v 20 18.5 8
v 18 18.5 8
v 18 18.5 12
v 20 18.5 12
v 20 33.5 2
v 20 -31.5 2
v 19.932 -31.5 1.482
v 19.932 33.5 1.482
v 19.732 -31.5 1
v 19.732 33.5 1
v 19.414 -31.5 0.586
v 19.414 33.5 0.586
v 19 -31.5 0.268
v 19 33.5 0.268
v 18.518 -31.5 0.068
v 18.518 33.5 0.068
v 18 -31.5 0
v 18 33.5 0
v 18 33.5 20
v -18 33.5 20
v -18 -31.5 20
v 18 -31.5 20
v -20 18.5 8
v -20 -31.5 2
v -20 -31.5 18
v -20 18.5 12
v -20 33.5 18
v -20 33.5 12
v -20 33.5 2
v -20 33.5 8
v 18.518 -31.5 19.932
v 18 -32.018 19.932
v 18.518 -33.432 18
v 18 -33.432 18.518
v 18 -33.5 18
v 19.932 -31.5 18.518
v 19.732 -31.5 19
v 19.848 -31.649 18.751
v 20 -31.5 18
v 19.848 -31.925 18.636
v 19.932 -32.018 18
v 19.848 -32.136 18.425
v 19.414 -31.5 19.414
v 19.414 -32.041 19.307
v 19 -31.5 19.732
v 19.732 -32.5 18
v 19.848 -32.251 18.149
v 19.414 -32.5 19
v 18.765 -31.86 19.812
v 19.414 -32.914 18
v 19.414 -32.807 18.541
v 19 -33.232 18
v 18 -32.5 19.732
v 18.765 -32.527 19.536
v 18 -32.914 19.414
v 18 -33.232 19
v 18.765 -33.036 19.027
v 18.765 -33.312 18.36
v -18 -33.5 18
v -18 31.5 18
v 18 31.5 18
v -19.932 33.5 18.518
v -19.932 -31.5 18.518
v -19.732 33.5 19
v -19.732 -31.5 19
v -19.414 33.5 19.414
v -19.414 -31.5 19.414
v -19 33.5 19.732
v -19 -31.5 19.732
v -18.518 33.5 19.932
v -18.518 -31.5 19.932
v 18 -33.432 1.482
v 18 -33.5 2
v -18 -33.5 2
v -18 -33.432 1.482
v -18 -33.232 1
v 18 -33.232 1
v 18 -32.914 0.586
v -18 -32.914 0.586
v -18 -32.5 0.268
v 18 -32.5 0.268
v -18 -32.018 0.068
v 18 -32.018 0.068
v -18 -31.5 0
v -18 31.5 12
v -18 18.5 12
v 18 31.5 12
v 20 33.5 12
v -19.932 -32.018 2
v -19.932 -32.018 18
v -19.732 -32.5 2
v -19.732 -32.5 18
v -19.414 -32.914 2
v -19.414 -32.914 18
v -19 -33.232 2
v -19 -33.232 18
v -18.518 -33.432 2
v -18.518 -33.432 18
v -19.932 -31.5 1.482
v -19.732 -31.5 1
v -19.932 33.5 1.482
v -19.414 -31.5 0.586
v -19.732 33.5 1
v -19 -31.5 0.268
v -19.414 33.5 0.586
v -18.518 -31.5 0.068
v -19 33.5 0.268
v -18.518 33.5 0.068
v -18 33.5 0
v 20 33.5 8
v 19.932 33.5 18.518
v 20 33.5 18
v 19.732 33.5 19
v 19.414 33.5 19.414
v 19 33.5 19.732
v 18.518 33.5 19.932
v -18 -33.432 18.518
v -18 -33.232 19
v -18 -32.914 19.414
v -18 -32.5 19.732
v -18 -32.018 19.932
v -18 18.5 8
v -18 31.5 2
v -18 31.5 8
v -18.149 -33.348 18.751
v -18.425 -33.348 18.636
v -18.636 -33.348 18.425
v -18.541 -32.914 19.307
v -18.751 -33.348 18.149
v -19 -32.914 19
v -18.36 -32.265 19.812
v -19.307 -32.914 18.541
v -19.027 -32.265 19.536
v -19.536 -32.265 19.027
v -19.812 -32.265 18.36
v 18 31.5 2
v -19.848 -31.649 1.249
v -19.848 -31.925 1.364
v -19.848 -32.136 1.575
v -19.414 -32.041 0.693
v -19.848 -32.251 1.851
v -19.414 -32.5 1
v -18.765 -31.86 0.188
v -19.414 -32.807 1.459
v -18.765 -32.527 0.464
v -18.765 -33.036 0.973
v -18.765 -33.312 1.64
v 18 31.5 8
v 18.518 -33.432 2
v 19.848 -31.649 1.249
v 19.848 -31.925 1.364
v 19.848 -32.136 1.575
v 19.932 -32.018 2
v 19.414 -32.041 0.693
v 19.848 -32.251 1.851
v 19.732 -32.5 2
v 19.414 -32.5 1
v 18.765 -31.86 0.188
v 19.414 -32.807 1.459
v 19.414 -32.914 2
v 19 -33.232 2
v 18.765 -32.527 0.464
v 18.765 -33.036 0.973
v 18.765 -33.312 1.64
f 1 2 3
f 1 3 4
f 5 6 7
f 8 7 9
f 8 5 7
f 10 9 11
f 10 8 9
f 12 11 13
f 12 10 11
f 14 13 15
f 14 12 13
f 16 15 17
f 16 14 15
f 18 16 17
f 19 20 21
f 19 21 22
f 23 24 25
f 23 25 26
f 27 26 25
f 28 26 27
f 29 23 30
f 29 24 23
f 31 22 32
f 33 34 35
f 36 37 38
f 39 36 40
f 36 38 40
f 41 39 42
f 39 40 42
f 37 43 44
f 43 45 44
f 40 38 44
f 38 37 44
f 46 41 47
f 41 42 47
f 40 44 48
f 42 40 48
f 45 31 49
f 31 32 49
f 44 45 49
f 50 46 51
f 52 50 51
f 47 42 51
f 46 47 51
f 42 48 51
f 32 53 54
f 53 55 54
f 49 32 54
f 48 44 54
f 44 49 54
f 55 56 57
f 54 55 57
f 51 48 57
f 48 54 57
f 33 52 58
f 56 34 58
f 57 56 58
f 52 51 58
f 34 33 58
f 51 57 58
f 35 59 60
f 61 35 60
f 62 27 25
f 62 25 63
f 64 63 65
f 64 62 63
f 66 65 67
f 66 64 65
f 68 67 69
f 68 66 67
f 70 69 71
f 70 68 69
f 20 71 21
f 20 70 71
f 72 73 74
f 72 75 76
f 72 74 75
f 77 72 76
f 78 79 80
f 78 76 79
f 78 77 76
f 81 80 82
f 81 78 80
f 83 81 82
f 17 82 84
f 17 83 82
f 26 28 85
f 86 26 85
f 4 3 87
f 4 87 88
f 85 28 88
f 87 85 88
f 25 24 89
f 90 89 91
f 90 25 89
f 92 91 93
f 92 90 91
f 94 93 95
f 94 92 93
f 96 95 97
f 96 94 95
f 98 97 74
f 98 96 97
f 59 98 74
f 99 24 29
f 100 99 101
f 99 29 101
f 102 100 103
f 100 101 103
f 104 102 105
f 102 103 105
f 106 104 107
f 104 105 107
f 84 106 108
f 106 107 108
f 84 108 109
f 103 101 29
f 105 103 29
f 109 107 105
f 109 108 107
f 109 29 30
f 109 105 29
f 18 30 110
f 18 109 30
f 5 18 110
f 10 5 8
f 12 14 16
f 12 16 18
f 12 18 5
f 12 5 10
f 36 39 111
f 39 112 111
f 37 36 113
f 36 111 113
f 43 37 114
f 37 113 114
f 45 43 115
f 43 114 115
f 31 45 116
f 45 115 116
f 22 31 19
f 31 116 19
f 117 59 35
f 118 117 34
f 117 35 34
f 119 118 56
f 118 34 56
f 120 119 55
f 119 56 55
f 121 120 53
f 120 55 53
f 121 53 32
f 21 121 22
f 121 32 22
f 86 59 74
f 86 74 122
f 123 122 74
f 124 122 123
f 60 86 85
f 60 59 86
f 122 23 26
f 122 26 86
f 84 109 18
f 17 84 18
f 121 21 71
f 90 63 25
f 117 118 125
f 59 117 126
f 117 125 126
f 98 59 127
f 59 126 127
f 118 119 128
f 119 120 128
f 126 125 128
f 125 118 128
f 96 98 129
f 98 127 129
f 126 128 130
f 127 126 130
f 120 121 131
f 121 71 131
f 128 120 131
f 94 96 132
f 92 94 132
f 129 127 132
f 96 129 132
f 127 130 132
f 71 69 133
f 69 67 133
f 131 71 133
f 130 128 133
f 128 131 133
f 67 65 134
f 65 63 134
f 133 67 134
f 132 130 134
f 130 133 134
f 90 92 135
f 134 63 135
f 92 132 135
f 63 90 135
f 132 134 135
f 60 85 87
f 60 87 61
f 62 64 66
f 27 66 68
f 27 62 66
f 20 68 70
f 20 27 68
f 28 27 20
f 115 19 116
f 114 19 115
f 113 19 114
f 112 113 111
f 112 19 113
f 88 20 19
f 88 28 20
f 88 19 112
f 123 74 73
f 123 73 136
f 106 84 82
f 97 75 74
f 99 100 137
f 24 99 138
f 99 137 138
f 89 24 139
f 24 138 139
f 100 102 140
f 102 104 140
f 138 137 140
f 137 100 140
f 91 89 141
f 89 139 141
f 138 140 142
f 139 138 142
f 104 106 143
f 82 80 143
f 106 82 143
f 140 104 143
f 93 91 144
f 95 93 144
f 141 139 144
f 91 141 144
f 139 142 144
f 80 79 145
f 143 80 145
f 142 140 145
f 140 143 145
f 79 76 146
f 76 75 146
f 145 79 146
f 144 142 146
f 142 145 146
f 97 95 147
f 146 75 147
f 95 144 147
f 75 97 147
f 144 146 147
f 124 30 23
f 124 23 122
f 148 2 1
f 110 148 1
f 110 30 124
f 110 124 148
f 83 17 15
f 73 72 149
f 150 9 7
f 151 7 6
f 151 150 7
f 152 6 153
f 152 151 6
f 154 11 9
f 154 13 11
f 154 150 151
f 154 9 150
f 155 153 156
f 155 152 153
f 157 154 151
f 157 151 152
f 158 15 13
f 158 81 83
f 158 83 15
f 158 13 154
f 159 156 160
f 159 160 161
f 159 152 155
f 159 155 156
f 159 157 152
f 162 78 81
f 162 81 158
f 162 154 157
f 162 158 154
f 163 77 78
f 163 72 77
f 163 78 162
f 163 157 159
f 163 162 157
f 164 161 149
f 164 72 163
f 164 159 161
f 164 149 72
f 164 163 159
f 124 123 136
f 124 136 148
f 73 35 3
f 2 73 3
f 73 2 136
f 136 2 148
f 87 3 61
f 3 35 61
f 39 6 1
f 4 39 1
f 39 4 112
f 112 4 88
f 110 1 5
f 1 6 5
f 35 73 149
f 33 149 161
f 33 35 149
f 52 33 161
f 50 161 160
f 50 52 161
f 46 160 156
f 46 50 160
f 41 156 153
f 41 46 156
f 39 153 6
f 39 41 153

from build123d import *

# Parameters (mm, degrees)
CROQUIS1_W              = 40
CROQUIS1_H              = 67
SALIENTE_EXTRUIR1_DEPTH = 20
REDONDEO1_R             = 2
VACIADO1_START          = -18
VACIADO1_OUTLINE_W      = 65
VACIADO1_OUTLINE_H      = 16
VACIADO1_DEPTH          = 36
CROQUIS2_W              = 40
CROQUIS2_H              = 4
CORTAR_EXTRUIR1_DEPTH   = 15


# Read off the part's stored shape, not the designer's step: Vaciado1
with BuildPart() as part:
    # Croquis1 → Saliente-Extruir1 (new body)
    with BuildSketch(Plane.XY):
        Rectangle(CROQUIS1_W, CROQUIS1_H)
    extrude(amount=SALIENTE_EXTRUIR1_DEPTH)

    # Redondeo1
    redondeo1_edges = [part.edges().sort_by_distance(p)[0] for p in [
        (-20, 0, 20),
        (0, -33.5, 20),
        (20, 0, 20),
        (0, -33.5, 0),
        (-20, 0, 0),
        (20, 0, 0),
        (20, -33.5, 10),
        (-20, -33.5, 10),
    ]]
    fillet(redondeo1_edges, radius=REDONDEO1_R)

    # Vaciado1 outline → Vaciado1 (cut)
    with BuildSketch(Plane.YZ.offset(VACIADO1_START)):
        with Locations((-1, 10)):
            Rectangle(VACIADO1_OUTLINE_W, VACIADO1_OUTLINE_H)
    extrude(amount=VACIADO1_DEPTH, mode=Mode.SUBTRACT)

    # Croquis2 → Cortar-Extruir1 (cut)
    with BuildSketch(Plane(origin=(0, 33.5, 0), x_dir=(1, 0, 0), z_dir=(0, 1, 0))):
        with Locations((0, -10)):
            Rectangle(CROQUIS2_W, CROQUIS2_H)
    extrude(amount=-CORTAR_EXTRUIR1_DEPTH, mode=Mode.SUBTRACT)


solid = part.part
